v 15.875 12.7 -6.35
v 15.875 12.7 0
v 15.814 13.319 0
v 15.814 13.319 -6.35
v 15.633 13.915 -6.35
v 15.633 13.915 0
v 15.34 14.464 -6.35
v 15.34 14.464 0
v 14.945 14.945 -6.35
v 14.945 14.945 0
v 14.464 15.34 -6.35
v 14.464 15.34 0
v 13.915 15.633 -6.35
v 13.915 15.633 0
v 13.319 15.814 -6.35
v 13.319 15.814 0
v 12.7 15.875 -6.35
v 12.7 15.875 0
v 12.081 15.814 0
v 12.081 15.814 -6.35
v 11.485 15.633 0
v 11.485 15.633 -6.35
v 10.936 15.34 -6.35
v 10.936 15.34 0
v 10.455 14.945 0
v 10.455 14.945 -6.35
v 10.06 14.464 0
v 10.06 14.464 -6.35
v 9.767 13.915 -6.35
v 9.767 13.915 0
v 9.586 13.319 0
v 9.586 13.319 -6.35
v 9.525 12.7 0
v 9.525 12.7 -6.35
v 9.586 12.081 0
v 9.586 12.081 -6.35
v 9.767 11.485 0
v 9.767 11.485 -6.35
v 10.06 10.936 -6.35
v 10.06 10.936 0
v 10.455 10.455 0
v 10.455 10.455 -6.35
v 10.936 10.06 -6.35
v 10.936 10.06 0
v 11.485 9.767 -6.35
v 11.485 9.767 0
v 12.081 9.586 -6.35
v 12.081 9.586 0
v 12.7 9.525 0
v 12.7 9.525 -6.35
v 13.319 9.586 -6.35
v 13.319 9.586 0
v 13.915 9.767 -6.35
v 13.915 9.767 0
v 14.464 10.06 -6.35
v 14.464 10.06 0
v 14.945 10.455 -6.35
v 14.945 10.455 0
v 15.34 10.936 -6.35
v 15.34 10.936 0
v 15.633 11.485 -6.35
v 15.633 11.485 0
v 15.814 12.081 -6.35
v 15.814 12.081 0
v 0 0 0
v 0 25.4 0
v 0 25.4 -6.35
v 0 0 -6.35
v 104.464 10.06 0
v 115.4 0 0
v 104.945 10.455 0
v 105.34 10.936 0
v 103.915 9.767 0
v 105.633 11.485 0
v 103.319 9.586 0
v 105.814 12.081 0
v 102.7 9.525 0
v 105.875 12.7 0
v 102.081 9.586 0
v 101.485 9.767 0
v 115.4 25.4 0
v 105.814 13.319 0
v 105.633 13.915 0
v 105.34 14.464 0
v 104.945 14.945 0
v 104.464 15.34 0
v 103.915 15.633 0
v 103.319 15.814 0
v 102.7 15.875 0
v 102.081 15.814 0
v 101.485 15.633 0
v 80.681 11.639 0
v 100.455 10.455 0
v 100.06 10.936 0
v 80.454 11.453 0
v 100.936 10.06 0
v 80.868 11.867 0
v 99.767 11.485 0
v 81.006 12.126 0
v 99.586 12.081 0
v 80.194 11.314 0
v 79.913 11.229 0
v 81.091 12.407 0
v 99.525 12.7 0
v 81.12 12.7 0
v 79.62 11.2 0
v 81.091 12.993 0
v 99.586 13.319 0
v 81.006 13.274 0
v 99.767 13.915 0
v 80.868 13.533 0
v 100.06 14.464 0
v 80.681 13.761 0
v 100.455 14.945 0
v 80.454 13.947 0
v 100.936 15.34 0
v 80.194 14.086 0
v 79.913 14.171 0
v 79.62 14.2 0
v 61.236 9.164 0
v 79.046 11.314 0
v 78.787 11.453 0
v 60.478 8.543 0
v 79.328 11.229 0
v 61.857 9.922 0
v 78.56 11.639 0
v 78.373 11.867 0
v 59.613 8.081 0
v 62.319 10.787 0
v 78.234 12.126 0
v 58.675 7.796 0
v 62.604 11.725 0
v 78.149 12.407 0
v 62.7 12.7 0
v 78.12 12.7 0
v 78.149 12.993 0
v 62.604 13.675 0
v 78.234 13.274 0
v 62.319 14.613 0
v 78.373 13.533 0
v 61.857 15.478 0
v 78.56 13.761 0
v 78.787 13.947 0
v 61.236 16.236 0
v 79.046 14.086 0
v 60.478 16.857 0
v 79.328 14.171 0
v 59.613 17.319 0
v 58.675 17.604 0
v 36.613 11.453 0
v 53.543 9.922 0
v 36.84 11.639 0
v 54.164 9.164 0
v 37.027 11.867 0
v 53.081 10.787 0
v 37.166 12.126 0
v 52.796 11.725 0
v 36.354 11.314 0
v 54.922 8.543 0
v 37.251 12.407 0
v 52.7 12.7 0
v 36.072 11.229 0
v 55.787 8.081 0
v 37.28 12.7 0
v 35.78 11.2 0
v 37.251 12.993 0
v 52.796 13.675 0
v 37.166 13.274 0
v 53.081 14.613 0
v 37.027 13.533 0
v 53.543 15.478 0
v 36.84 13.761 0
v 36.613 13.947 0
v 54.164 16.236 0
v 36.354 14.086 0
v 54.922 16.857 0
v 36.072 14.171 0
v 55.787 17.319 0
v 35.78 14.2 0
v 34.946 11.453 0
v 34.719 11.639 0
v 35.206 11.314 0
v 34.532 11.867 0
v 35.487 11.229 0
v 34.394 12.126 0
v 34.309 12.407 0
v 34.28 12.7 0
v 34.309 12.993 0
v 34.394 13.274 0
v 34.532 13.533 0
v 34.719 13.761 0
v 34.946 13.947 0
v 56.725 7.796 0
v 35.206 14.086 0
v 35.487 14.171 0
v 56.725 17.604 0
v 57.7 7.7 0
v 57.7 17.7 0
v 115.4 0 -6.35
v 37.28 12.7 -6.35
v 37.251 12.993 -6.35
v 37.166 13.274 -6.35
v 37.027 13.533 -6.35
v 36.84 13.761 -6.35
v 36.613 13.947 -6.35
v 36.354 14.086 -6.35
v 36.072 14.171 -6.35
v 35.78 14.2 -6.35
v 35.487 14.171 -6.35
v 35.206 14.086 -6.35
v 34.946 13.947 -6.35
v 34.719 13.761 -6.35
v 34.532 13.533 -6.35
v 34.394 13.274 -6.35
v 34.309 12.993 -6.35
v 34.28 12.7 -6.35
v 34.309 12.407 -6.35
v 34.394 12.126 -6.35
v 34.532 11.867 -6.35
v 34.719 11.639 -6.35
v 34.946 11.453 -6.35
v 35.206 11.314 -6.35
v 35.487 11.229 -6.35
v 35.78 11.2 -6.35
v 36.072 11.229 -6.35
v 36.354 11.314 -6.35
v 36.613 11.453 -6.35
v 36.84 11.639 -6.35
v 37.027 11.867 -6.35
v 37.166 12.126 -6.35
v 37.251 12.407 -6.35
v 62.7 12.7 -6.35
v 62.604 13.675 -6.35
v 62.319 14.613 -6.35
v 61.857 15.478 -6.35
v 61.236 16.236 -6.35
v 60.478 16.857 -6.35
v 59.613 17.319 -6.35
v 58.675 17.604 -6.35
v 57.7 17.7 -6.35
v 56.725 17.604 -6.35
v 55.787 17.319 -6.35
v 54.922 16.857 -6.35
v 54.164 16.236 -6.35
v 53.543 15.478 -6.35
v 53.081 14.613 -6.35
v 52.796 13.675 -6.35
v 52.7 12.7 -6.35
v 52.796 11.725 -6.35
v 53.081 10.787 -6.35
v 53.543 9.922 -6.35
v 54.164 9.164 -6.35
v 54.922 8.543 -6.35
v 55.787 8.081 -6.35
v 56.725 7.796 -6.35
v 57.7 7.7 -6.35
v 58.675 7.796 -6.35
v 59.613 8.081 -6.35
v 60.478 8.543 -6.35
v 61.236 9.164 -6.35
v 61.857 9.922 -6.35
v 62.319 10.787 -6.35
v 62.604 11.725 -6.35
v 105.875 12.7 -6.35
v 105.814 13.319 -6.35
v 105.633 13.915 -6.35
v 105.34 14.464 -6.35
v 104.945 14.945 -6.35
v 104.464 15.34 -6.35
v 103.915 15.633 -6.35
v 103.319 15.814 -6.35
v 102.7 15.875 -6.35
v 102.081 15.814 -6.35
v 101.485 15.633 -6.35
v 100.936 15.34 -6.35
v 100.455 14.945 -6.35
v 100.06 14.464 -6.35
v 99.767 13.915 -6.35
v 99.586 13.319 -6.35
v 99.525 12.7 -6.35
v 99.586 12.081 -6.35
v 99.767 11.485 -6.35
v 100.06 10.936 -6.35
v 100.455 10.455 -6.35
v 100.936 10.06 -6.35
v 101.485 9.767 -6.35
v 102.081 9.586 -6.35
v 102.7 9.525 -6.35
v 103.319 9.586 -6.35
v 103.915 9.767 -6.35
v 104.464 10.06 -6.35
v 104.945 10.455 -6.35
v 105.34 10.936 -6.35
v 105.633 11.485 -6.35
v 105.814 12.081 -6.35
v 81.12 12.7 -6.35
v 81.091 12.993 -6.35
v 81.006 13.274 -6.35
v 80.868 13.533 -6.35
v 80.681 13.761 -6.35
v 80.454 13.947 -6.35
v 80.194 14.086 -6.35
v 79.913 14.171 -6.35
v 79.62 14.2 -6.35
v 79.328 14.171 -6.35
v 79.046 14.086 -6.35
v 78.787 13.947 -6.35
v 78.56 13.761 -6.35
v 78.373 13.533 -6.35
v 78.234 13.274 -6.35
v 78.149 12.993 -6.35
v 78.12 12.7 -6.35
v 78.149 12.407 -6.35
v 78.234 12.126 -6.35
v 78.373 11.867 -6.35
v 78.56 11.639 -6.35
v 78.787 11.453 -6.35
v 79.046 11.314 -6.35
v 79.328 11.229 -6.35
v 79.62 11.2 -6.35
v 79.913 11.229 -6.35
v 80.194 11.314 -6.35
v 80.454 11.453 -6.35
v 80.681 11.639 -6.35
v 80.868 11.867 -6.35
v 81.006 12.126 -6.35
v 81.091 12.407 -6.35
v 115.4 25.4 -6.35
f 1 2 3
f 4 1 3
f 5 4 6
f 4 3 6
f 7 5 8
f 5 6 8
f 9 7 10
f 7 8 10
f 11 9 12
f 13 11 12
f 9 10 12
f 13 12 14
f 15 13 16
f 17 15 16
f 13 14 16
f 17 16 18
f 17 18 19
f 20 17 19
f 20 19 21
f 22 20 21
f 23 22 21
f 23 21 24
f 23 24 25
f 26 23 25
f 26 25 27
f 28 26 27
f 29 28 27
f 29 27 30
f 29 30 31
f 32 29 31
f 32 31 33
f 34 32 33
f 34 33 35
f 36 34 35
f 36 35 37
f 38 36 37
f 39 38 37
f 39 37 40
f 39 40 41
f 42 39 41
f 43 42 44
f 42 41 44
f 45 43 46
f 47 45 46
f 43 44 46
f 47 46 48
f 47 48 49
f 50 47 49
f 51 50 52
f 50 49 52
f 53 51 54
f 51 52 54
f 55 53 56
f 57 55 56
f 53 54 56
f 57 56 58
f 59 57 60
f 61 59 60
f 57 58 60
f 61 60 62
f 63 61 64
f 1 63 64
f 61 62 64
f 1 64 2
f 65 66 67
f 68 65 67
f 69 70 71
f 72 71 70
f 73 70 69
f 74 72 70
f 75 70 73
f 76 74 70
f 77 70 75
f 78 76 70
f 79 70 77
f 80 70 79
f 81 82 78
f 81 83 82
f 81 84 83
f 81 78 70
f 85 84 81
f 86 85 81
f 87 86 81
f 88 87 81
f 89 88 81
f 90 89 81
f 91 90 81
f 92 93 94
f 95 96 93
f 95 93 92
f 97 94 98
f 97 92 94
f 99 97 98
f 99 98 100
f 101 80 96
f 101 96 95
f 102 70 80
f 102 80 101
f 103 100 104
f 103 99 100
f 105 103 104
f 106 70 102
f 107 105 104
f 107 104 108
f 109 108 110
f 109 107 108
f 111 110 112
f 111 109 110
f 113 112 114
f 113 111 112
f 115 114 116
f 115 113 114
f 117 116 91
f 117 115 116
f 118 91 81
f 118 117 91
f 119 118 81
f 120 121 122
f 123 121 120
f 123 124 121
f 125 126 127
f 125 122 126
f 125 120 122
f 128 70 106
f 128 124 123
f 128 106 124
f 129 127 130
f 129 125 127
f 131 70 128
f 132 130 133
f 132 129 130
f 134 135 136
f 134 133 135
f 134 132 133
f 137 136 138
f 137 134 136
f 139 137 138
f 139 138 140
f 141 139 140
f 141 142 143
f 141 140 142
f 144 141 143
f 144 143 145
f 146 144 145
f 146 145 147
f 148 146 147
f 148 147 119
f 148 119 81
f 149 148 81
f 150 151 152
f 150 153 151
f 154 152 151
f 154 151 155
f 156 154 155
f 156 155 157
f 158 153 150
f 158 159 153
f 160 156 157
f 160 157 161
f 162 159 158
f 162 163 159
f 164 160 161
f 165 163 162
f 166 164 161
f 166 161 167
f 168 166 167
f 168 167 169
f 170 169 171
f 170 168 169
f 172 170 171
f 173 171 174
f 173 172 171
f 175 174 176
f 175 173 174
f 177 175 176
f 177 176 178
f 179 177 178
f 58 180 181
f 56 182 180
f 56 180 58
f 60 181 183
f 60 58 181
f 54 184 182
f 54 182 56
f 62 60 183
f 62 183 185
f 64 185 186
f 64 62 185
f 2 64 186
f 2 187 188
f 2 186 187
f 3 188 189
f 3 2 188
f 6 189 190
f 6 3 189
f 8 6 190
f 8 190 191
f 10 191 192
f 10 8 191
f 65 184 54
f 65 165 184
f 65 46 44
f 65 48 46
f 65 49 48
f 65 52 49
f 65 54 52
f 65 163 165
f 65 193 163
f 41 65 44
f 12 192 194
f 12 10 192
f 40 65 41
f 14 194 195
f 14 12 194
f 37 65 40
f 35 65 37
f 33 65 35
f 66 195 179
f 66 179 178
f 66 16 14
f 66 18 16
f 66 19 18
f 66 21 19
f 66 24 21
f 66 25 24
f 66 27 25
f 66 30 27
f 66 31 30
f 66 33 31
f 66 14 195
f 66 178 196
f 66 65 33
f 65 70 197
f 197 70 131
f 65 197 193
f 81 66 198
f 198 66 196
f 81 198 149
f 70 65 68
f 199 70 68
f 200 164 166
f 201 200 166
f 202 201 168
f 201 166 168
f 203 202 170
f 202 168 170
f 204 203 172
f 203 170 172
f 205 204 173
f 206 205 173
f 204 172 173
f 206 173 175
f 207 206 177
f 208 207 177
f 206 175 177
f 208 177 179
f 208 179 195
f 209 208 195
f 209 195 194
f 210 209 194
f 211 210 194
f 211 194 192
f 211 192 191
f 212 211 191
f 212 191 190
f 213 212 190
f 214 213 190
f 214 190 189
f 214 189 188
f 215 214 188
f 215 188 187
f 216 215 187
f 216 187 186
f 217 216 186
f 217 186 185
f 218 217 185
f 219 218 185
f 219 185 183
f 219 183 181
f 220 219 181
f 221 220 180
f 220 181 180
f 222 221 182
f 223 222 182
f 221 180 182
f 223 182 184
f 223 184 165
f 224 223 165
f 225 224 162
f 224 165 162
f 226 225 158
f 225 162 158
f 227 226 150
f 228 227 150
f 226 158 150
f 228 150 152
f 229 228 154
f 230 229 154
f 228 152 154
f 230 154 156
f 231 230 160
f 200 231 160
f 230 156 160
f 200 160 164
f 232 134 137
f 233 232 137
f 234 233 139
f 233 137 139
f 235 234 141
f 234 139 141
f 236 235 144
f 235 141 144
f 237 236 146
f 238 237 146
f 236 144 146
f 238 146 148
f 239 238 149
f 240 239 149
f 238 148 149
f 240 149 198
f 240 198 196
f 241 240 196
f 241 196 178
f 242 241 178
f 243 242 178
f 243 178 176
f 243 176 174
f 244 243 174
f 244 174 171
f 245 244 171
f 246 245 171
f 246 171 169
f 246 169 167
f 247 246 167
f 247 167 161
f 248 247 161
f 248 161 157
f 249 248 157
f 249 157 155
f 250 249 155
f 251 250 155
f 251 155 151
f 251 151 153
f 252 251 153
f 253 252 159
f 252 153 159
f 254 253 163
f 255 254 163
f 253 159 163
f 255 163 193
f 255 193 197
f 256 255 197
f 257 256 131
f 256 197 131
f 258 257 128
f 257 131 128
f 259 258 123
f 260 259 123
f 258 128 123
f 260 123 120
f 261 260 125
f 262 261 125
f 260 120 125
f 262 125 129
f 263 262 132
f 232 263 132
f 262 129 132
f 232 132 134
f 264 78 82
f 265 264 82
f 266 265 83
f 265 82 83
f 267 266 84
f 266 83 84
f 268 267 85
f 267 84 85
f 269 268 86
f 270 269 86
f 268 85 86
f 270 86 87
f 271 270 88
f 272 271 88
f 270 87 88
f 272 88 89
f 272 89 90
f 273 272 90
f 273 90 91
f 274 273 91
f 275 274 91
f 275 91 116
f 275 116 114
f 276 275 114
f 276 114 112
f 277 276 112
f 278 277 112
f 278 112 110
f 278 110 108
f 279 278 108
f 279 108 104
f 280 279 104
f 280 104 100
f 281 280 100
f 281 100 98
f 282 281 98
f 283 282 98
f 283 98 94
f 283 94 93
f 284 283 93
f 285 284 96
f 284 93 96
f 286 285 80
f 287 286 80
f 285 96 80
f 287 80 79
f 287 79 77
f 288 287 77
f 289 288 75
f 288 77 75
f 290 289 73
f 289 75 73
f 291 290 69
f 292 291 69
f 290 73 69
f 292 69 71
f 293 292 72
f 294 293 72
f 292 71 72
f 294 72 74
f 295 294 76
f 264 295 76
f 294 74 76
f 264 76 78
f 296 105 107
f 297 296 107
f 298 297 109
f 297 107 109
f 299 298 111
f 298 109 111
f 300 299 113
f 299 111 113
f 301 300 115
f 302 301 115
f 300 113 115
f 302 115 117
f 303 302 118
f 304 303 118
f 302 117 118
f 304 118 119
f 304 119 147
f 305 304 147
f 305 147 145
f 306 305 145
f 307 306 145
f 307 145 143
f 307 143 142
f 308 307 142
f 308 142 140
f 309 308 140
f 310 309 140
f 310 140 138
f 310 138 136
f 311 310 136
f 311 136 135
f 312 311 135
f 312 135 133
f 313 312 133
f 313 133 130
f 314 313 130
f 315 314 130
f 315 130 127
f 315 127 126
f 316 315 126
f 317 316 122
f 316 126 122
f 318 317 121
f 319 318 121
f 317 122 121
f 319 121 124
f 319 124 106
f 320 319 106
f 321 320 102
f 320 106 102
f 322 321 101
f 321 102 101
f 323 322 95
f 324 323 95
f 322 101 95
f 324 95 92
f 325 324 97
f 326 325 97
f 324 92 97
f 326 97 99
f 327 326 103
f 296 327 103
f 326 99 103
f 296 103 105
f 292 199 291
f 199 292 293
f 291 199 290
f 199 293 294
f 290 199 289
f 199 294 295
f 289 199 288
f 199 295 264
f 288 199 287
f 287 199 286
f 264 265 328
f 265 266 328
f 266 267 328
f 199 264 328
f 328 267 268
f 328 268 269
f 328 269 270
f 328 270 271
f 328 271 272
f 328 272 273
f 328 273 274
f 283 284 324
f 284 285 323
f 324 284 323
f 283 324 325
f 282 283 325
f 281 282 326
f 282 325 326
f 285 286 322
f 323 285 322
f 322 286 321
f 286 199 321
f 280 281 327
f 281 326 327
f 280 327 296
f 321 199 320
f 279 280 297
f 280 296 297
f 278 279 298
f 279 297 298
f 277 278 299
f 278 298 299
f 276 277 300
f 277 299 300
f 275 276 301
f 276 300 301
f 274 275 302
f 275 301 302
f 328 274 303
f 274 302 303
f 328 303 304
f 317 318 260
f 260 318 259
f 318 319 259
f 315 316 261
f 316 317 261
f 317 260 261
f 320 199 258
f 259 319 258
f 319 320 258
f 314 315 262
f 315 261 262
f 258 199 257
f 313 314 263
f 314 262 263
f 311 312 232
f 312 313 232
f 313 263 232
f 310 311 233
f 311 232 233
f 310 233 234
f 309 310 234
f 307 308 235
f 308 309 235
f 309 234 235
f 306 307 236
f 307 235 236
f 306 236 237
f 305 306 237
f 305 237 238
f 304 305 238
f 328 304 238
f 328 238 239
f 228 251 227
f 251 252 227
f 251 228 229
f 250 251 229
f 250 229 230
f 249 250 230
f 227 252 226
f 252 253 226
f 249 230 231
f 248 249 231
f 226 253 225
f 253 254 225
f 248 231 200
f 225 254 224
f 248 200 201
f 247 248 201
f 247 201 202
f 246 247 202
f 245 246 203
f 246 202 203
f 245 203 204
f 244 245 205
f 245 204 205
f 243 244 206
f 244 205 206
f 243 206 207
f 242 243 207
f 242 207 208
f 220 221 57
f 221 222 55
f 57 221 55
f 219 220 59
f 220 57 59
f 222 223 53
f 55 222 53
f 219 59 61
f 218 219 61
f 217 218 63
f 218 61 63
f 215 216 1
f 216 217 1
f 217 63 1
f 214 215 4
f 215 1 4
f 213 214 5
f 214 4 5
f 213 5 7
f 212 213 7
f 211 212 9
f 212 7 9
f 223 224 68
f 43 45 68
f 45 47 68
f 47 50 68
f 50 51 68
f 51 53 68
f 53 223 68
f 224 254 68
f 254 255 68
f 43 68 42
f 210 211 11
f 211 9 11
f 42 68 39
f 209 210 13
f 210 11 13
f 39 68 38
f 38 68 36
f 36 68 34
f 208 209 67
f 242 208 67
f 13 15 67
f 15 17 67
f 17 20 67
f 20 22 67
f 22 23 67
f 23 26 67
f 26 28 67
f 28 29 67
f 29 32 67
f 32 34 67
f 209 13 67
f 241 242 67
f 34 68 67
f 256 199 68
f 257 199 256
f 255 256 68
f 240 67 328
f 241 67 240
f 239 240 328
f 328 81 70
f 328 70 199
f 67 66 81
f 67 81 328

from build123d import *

# Parameters (mm, degrees)
SKETCH1_W           = 6.35
SKETCH1_H           = 25.4
BOSS_EXTRUDE1_DEPTH = 115.4
SKETCH2_R           = 5
SKETCH2_R_2         = 1.5
SKETCH2_R_3         = 3.175
CUT_EXTRUDE1_DEPTH  = 119.332761736


with BuildPart() as part:
    # Sketch1 → Boss-Extrude1 (new body)
    with BuildSketch(Plane(origin=(0, 0, 0), x_dir=(0, 0, -1), z_dir=(1, 0, 0))):
        with Locations((3.175, 12.7)):
            Rectangle(SKETCH1_W, SKETCH1_H)
    extrude(amount=BOSS_EXTRUDE1_DEPTH)

    # Sketch2 → Cut-Extrude1 (cut, through all)
    with BuildSketch(Plane.XY):
        with Locations((57.7, 12.7)):
            Circle(SKETCH2_R)
        with Locations((35.779689783, 12.7)):
            Circle(SKETCH2_R_2)
        with Locations((12.7, 12.7)):
            Circle(SKETCH2_R_3)
        with Locations((79.620310217, 12.7)):
            Circle(SKETCH2_R_2)
        with Locations((102.7, 12.7)):
            Circle(SKETCH2_R_3)
    extrude(amount=-CUT_EXTRUDE1_DEPTH, mode=Mode.SUBTRACT)


solid = part.part
